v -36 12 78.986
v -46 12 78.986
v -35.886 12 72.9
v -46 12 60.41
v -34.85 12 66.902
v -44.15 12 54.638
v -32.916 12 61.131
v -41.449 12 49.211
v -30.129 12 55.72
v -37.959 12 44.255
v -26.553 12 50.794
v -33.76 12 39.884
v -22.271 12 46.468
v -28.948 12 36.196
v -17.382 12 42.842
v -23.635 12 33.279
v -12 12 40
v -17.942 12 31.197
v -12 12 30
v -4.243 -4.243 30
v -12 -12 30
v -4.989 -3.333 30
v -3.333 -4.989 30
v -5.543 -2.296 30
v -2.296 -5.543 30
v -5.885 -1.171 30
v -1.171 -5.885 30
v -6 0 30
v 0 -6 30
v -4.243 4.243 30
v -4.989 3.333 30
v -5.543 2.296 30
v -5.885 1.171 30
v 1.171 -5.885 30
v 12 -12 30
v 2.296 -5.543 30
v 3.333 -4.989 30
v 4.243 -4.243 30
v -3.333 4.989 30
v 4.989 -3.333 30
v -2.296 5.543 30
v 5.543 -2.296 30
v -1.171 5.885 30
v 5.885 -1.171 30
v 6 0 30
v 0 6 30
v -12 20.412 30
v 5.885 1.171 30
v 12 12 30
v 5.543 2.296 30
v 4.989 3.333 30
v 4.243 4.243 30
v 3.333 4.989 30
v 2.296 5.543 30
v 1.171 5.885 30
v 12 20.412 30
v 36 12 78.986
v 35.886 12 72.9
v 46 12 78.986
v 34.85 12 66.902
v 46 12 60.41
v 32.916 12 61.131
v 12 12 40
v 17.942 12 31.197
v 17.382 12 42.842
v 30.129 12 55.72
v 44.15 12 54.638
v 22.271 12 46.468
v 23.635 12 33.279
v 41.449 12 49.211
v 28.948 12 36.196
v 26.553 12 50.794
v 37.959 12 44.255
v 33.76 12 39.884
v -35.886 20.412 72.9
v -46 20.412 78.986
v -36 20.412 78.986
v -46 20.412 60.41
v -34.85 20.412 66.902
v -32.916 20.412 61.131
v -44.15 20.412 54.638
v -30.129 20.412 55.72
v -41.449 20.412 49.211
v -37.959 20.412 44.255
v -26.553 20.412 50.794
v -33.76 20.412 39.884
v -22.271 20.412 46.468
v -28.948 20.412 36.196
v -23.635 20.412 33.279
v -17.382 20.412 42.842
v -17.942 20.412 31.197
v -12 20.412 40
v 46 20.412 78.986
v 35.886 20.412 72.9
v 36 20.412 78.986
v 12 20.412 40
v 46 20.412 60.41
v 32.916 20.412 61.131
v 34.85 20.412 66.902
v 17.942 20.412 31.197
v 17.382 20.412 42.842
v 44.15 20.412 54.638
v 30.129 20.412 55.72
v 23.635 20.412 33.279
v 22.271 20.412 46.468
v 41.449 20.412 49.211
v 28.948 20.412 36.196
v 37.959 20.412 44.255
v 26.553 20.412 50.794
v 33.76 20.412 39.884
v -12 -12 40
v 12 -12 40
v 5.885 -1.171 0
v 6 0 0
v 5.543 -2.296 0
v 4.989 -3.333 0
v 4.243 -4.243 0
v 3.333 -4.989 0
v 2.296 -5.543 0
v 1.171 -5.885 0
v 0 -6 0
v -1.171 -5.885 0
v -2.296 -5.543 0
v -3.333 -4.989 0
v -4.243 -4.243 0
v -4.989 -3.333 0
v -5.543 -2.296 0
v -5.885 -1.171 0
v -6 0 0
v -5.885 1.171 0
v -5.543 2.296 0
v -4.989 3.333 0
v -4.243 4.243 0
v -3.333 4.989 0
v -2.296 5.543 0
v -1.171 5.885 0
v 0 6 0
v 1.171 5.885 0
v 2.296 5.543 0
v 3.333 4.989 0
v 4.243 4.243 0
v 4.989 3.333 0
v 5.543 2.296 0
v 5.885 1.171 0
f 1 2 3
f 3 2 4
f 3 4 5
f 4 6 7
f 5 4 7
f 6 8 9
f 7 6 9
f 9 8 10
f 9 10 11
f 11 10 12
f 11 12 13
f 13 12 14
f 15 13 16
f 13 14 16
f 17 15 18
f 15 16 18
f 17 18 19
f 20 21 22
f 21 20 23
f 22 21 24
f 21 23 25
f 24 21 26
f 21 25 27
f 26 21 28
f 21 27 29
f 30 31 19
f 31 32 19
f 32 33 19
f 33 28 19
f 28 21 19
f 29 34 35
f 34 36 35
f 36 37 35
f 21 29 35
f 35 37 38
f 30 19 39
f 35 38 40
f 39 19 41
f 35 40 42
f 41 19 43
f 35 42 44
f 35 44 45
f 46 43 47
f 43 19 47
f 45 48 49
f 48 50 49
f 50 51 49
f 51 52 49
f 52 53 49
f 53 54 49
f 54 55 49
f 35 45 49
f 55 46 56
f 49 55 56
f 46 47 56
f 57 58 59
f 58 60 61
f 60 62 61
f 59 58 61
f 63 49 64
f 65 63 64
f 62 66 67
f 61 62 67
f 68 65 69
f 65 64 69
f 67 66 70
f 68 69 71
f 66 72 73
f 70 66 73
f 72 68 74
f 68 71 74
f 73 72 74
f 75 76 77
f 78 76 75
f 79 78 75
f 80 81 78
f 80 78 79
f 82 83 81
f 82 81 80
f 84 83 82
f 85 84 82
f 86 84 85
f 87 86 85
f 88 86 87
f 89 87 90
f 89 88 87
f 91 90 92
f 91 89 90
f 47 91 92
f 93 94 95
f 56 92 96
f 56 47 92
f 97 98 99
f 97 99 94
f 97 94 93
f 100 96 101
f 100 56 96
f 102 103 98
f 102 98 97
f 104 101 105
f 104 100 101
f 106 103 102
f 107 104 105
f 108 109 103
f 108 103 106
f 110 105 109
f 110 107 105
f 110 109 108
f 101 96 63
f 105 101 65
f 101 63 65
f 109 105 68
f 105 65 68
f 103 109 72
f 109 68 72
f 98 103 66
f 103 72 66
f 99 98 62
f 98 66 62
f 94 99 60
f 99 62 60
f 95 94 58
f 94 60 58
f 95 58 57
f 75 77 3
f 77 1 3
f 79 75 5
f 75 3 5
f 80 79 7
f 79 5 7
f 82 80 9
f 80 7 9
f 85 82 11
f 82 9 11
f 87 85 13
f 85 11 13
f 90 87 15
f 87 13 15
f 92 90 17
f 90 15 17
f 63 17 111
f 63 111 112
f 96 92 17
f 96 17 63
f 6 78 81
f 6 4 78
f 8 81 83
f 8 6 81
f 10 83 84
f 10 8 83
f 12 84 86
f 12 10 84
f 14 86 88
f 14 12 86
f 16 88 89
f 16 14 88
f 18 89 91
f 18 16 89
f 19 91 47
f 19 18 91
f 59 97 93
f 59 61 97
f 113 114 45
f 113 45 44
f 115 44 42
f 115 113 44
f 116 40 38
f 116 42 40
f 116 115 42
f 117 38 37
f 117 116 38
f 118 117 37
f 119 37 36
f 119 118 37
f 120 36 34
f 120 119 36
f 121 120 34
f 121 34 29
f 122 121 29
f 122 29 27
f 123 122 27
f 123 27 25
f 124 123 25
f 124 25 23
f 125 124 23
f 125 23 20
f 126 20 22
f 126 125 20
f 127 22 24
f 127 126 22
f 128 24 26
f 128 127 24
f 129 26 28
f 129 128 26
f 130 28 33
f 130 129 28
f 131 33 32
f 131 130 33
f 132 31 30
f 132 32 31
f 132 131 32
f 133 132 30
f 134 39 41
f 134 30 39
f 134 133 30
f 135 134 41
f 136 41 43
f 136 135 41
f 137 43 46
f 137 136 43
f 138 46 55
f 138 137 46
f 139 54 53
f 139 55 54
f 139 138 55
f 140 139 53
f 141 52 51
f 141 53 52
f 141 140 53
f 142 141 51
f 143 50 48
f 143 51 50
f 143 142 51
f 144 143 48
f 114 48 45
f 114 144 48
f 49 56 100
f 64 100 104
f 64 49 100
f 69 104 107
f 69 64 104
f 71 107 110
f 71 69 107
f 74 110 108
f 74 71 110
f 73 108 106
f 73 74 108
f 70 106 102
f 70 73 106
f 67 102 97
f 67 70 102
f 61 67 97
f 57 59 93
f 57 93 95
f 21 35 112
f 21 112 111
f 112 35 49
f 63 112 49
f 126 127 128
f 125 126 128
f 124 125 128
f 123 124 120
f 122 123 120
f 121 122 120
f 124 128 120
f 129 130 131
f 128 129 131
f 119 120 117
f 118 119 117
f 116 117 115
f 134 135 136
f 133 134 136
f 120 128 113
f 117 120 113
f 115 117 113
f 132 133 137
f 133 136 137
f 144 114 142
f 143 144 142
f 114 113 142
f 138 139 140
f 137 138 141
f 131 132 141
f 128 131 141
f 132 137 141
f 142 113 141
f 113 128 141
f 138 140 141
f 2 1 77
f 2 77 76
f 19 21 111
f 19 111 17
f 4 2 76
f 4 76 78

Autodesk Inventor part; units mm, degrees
ref_plane "YZ Plane" through (0, 0, 0) normal (1, 0, 0) x (0, 1, 0)
ref_plane "XZ Plane" through (0, 0, 0) normal (0, 1, 0) x (-1, 0, 0)
ref_plane "XY Plane" through (0, 0, 0) normal (0, 0, 1) x (1, 0, 0)
sketch "Sketch1" plane through (0, 0, 0) normal (0, 0, 1) x (1, 0, 0)
  circle A0 centre (0, 0) radius 6
  dimension "d0" = 12
extrude "Extrusion1" add sketch "Sketch1" along normal blind 30
sketch "Sketch2" plane through (0, 0, 30) normal (0, 0, 1) x (1, 0, 0)
  line L0 (0, 0) -> (12, 0)
  line L1 (12, 0) -> (12, 12)
  line L2 (12, 12) -> (0, 12)
  line L3 (0, 12) -> (0, 0)
  line L4 (0, 0) -> (12, 0)
  line L5 (12, 0) -> (12, -12)
  line L6 (12, -12) -> (0, -12)
  line L7 (0, -12) -> (0, 0)
  line L8 (0, 0) -> (-12, 0)
  line L9 (-12, 0) -> (-12, 12)
  line L10 (-12, 12) -> (0, 12)
  line L11 (0, 12) -> (0, 0)
  line L12 (-12, 0) -> (0, 0)
  line L13 (0, 0) -> (0, -12)
  line L14 (0, -12) -> (-12, -12)
  line L15 (-12, -12) -> (-12, 0)
  dimension "d3" = 12
  dimension "d4" = 12
  dimension "d5" = 12
  dimension "d6" = 12
extrude "Extrusion2" add sketch "Sketch2" along normal blind 10
sketch "Sketch3" plane through (-12, 12, 30) normal (0, 1, 0) x (1, 0, 0)
  line L0 (0, 0) -> (24, 0) projected
  line L1 (0, 0) -> (24, 0)
  line L2 (24, 0) -> (24, -48.9856)
  line L3 (24, -48.9856) -> (0, -48.9856)
  line L4 (0, -48.9856) -> (0, 0)
  line L5 (0, 0) -> (0, -10) projected
  line L6 (0, 0) -> (-24, 0)
  line L7 (-24, 0) -> (-24, -48.9856)
  line L8 (-24, -48.9856) -> (0, -48.9856)
  line L9 (0, -48.9856) -> (0, 0)
  arc A0 (0, -10) -> (-24, -48.9856) centre (15.934, -46.6893) ccw
  line L10 (24, 0) -> (24, -10) projected
  line L11 (24, 0) -> (48, 0)
  line L12 (48, 0) -> (48, -48.9856)
  line L13 (48, -48.9856) -> (24, -48.9856)
  line L14 (24, -48.9856) -> (24, 0)
  line L15 (0, -10) -> (24, -10) projected
  arc A1 (48, -48.9856) -> (24, -10) centre (8.066, -46.6893) ccw
  line L16 (-24, -48.9856) -> (-34, -48.9856)
  line L17 (-34, -48.9856) -> (-34, 0)
  line L18 (-34, 0) -> (-24, 0)
  line L19 (-24, 0) -> (-24, -48.9856)
  line L20 (48, 0) -> (58, 0)
  line L21 (58, 0) -> (58, -48.9856)
  line L22 (58, -48.9856) -> (48, -48.9856)
  line L23 (48, -48.9856) -> (48, 0)
  arc A2 (0, 0) -> (-34, -48.9856) centre (4.9068, -39.6979) ccw
  arc A3 (58, -48.9856) -> (24, 0) centre (19.0932, -39.6979) ccw
  point P0 (12, 30)
  point P1 (58, -30.4102)
  point P2 (-34, -30.4102)
  dimension "d9" = 24
  dimension "d10" = 24
  dimension "d11" = 40
  dimension "d12" = 24
  dimension "d13" = 40
  dimension "d14" = 10
  dimension "d15" = 10
  dimension "d16" = 40
  dimension "d17" = 40
extrude "Extrusion3" add sketch "Sketch3" along normal blind 8.4125 contours L0 L2 L15 L4 | L4 A0 L7 A2 | A3 L12 A1 L2 | L7 A0 L16 L17 A2 | A3 L21 L22 A1 L12
properties part number "End"
